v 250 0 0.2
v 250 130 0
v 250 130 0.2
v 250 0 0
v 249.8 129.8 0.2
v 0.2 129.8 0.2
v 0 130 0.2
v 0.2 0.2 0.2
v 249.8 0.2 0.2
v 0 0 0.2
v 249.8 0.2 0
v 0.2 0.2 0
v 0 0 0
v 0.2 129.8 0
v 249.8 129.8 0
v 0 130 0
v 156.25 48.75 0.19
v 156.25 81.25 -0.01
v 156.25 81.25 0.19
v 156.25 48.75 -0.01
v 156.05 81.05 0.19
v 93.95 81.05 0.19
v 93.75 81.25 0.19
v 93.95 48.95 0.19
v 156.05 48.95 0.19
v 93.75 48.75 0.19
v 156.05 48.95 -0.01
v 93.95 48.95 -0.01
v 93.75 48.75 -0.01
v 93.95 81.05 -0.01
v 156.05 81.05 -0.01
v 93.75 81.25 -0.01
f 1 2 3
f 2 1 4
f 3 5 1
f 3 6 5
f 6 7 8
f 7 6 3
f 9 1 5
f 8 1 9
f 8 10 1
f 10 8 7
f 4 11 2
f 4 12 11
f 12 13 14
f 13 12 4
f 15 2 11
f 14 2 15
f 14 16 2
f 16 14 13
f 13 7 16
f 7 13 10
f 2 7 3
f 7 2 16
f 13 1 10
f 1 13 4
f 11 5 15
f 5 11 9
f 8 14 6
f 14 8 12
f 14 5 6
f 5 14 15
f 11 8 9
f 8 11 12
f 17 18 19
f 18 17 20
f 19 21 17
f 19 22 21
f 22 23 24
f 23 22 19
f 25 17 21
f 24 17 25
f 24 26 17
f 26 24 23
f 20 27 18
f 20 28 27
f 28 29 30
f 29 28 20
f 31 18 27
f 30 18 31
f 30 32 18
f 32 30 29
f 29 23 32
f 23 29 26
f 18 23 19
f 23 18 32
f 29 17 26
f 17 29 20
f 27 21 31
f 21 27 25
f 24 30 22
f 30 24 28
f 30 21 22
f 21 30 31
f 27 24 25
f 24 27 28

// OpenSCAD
// project		: mT-101
// used for calibration

// author 		: vincent
// date   		: 6.20.2013

// www.metarobotics.com
// It is licensed under the Creative Commons - GNU GPL license.

//printing specification
//this is for makerbot replicator 2
flate_x = 285;
flate_y = 153;

//test argument
test_height = 0.2;	// single layer
line_width = 0.2;	// single line

module leveltest()
{
	//outer square test
	//printing offset
	x_offset = 35;
	y_offset = 23;

	x1 = flate_x-x_offset;
	y1 = flate_y-y_offset;

	difference()
	{
		cube([x1,y1,test_height]);

		translate([line_width,line_width,-0.1])
		cube([x1-line_width*2,y1-line_width*2,test_height + 0.2]);
	}

	//inner square test
	inner_factor = 0.25;
	x2 = x1*inner_factor;
	y2 = y1*inner_factor;

	translate([x1/2-x2/2,y1/2-y2/2,-0.01])
	difference()
	{
		cube([x2,y2,test_height]);

		translate([line_width,line_width,-0.1])
		cube([x2-line_width*2,y2-line_width*2,test_height + 0.2]);
	}
}

leveltest();
